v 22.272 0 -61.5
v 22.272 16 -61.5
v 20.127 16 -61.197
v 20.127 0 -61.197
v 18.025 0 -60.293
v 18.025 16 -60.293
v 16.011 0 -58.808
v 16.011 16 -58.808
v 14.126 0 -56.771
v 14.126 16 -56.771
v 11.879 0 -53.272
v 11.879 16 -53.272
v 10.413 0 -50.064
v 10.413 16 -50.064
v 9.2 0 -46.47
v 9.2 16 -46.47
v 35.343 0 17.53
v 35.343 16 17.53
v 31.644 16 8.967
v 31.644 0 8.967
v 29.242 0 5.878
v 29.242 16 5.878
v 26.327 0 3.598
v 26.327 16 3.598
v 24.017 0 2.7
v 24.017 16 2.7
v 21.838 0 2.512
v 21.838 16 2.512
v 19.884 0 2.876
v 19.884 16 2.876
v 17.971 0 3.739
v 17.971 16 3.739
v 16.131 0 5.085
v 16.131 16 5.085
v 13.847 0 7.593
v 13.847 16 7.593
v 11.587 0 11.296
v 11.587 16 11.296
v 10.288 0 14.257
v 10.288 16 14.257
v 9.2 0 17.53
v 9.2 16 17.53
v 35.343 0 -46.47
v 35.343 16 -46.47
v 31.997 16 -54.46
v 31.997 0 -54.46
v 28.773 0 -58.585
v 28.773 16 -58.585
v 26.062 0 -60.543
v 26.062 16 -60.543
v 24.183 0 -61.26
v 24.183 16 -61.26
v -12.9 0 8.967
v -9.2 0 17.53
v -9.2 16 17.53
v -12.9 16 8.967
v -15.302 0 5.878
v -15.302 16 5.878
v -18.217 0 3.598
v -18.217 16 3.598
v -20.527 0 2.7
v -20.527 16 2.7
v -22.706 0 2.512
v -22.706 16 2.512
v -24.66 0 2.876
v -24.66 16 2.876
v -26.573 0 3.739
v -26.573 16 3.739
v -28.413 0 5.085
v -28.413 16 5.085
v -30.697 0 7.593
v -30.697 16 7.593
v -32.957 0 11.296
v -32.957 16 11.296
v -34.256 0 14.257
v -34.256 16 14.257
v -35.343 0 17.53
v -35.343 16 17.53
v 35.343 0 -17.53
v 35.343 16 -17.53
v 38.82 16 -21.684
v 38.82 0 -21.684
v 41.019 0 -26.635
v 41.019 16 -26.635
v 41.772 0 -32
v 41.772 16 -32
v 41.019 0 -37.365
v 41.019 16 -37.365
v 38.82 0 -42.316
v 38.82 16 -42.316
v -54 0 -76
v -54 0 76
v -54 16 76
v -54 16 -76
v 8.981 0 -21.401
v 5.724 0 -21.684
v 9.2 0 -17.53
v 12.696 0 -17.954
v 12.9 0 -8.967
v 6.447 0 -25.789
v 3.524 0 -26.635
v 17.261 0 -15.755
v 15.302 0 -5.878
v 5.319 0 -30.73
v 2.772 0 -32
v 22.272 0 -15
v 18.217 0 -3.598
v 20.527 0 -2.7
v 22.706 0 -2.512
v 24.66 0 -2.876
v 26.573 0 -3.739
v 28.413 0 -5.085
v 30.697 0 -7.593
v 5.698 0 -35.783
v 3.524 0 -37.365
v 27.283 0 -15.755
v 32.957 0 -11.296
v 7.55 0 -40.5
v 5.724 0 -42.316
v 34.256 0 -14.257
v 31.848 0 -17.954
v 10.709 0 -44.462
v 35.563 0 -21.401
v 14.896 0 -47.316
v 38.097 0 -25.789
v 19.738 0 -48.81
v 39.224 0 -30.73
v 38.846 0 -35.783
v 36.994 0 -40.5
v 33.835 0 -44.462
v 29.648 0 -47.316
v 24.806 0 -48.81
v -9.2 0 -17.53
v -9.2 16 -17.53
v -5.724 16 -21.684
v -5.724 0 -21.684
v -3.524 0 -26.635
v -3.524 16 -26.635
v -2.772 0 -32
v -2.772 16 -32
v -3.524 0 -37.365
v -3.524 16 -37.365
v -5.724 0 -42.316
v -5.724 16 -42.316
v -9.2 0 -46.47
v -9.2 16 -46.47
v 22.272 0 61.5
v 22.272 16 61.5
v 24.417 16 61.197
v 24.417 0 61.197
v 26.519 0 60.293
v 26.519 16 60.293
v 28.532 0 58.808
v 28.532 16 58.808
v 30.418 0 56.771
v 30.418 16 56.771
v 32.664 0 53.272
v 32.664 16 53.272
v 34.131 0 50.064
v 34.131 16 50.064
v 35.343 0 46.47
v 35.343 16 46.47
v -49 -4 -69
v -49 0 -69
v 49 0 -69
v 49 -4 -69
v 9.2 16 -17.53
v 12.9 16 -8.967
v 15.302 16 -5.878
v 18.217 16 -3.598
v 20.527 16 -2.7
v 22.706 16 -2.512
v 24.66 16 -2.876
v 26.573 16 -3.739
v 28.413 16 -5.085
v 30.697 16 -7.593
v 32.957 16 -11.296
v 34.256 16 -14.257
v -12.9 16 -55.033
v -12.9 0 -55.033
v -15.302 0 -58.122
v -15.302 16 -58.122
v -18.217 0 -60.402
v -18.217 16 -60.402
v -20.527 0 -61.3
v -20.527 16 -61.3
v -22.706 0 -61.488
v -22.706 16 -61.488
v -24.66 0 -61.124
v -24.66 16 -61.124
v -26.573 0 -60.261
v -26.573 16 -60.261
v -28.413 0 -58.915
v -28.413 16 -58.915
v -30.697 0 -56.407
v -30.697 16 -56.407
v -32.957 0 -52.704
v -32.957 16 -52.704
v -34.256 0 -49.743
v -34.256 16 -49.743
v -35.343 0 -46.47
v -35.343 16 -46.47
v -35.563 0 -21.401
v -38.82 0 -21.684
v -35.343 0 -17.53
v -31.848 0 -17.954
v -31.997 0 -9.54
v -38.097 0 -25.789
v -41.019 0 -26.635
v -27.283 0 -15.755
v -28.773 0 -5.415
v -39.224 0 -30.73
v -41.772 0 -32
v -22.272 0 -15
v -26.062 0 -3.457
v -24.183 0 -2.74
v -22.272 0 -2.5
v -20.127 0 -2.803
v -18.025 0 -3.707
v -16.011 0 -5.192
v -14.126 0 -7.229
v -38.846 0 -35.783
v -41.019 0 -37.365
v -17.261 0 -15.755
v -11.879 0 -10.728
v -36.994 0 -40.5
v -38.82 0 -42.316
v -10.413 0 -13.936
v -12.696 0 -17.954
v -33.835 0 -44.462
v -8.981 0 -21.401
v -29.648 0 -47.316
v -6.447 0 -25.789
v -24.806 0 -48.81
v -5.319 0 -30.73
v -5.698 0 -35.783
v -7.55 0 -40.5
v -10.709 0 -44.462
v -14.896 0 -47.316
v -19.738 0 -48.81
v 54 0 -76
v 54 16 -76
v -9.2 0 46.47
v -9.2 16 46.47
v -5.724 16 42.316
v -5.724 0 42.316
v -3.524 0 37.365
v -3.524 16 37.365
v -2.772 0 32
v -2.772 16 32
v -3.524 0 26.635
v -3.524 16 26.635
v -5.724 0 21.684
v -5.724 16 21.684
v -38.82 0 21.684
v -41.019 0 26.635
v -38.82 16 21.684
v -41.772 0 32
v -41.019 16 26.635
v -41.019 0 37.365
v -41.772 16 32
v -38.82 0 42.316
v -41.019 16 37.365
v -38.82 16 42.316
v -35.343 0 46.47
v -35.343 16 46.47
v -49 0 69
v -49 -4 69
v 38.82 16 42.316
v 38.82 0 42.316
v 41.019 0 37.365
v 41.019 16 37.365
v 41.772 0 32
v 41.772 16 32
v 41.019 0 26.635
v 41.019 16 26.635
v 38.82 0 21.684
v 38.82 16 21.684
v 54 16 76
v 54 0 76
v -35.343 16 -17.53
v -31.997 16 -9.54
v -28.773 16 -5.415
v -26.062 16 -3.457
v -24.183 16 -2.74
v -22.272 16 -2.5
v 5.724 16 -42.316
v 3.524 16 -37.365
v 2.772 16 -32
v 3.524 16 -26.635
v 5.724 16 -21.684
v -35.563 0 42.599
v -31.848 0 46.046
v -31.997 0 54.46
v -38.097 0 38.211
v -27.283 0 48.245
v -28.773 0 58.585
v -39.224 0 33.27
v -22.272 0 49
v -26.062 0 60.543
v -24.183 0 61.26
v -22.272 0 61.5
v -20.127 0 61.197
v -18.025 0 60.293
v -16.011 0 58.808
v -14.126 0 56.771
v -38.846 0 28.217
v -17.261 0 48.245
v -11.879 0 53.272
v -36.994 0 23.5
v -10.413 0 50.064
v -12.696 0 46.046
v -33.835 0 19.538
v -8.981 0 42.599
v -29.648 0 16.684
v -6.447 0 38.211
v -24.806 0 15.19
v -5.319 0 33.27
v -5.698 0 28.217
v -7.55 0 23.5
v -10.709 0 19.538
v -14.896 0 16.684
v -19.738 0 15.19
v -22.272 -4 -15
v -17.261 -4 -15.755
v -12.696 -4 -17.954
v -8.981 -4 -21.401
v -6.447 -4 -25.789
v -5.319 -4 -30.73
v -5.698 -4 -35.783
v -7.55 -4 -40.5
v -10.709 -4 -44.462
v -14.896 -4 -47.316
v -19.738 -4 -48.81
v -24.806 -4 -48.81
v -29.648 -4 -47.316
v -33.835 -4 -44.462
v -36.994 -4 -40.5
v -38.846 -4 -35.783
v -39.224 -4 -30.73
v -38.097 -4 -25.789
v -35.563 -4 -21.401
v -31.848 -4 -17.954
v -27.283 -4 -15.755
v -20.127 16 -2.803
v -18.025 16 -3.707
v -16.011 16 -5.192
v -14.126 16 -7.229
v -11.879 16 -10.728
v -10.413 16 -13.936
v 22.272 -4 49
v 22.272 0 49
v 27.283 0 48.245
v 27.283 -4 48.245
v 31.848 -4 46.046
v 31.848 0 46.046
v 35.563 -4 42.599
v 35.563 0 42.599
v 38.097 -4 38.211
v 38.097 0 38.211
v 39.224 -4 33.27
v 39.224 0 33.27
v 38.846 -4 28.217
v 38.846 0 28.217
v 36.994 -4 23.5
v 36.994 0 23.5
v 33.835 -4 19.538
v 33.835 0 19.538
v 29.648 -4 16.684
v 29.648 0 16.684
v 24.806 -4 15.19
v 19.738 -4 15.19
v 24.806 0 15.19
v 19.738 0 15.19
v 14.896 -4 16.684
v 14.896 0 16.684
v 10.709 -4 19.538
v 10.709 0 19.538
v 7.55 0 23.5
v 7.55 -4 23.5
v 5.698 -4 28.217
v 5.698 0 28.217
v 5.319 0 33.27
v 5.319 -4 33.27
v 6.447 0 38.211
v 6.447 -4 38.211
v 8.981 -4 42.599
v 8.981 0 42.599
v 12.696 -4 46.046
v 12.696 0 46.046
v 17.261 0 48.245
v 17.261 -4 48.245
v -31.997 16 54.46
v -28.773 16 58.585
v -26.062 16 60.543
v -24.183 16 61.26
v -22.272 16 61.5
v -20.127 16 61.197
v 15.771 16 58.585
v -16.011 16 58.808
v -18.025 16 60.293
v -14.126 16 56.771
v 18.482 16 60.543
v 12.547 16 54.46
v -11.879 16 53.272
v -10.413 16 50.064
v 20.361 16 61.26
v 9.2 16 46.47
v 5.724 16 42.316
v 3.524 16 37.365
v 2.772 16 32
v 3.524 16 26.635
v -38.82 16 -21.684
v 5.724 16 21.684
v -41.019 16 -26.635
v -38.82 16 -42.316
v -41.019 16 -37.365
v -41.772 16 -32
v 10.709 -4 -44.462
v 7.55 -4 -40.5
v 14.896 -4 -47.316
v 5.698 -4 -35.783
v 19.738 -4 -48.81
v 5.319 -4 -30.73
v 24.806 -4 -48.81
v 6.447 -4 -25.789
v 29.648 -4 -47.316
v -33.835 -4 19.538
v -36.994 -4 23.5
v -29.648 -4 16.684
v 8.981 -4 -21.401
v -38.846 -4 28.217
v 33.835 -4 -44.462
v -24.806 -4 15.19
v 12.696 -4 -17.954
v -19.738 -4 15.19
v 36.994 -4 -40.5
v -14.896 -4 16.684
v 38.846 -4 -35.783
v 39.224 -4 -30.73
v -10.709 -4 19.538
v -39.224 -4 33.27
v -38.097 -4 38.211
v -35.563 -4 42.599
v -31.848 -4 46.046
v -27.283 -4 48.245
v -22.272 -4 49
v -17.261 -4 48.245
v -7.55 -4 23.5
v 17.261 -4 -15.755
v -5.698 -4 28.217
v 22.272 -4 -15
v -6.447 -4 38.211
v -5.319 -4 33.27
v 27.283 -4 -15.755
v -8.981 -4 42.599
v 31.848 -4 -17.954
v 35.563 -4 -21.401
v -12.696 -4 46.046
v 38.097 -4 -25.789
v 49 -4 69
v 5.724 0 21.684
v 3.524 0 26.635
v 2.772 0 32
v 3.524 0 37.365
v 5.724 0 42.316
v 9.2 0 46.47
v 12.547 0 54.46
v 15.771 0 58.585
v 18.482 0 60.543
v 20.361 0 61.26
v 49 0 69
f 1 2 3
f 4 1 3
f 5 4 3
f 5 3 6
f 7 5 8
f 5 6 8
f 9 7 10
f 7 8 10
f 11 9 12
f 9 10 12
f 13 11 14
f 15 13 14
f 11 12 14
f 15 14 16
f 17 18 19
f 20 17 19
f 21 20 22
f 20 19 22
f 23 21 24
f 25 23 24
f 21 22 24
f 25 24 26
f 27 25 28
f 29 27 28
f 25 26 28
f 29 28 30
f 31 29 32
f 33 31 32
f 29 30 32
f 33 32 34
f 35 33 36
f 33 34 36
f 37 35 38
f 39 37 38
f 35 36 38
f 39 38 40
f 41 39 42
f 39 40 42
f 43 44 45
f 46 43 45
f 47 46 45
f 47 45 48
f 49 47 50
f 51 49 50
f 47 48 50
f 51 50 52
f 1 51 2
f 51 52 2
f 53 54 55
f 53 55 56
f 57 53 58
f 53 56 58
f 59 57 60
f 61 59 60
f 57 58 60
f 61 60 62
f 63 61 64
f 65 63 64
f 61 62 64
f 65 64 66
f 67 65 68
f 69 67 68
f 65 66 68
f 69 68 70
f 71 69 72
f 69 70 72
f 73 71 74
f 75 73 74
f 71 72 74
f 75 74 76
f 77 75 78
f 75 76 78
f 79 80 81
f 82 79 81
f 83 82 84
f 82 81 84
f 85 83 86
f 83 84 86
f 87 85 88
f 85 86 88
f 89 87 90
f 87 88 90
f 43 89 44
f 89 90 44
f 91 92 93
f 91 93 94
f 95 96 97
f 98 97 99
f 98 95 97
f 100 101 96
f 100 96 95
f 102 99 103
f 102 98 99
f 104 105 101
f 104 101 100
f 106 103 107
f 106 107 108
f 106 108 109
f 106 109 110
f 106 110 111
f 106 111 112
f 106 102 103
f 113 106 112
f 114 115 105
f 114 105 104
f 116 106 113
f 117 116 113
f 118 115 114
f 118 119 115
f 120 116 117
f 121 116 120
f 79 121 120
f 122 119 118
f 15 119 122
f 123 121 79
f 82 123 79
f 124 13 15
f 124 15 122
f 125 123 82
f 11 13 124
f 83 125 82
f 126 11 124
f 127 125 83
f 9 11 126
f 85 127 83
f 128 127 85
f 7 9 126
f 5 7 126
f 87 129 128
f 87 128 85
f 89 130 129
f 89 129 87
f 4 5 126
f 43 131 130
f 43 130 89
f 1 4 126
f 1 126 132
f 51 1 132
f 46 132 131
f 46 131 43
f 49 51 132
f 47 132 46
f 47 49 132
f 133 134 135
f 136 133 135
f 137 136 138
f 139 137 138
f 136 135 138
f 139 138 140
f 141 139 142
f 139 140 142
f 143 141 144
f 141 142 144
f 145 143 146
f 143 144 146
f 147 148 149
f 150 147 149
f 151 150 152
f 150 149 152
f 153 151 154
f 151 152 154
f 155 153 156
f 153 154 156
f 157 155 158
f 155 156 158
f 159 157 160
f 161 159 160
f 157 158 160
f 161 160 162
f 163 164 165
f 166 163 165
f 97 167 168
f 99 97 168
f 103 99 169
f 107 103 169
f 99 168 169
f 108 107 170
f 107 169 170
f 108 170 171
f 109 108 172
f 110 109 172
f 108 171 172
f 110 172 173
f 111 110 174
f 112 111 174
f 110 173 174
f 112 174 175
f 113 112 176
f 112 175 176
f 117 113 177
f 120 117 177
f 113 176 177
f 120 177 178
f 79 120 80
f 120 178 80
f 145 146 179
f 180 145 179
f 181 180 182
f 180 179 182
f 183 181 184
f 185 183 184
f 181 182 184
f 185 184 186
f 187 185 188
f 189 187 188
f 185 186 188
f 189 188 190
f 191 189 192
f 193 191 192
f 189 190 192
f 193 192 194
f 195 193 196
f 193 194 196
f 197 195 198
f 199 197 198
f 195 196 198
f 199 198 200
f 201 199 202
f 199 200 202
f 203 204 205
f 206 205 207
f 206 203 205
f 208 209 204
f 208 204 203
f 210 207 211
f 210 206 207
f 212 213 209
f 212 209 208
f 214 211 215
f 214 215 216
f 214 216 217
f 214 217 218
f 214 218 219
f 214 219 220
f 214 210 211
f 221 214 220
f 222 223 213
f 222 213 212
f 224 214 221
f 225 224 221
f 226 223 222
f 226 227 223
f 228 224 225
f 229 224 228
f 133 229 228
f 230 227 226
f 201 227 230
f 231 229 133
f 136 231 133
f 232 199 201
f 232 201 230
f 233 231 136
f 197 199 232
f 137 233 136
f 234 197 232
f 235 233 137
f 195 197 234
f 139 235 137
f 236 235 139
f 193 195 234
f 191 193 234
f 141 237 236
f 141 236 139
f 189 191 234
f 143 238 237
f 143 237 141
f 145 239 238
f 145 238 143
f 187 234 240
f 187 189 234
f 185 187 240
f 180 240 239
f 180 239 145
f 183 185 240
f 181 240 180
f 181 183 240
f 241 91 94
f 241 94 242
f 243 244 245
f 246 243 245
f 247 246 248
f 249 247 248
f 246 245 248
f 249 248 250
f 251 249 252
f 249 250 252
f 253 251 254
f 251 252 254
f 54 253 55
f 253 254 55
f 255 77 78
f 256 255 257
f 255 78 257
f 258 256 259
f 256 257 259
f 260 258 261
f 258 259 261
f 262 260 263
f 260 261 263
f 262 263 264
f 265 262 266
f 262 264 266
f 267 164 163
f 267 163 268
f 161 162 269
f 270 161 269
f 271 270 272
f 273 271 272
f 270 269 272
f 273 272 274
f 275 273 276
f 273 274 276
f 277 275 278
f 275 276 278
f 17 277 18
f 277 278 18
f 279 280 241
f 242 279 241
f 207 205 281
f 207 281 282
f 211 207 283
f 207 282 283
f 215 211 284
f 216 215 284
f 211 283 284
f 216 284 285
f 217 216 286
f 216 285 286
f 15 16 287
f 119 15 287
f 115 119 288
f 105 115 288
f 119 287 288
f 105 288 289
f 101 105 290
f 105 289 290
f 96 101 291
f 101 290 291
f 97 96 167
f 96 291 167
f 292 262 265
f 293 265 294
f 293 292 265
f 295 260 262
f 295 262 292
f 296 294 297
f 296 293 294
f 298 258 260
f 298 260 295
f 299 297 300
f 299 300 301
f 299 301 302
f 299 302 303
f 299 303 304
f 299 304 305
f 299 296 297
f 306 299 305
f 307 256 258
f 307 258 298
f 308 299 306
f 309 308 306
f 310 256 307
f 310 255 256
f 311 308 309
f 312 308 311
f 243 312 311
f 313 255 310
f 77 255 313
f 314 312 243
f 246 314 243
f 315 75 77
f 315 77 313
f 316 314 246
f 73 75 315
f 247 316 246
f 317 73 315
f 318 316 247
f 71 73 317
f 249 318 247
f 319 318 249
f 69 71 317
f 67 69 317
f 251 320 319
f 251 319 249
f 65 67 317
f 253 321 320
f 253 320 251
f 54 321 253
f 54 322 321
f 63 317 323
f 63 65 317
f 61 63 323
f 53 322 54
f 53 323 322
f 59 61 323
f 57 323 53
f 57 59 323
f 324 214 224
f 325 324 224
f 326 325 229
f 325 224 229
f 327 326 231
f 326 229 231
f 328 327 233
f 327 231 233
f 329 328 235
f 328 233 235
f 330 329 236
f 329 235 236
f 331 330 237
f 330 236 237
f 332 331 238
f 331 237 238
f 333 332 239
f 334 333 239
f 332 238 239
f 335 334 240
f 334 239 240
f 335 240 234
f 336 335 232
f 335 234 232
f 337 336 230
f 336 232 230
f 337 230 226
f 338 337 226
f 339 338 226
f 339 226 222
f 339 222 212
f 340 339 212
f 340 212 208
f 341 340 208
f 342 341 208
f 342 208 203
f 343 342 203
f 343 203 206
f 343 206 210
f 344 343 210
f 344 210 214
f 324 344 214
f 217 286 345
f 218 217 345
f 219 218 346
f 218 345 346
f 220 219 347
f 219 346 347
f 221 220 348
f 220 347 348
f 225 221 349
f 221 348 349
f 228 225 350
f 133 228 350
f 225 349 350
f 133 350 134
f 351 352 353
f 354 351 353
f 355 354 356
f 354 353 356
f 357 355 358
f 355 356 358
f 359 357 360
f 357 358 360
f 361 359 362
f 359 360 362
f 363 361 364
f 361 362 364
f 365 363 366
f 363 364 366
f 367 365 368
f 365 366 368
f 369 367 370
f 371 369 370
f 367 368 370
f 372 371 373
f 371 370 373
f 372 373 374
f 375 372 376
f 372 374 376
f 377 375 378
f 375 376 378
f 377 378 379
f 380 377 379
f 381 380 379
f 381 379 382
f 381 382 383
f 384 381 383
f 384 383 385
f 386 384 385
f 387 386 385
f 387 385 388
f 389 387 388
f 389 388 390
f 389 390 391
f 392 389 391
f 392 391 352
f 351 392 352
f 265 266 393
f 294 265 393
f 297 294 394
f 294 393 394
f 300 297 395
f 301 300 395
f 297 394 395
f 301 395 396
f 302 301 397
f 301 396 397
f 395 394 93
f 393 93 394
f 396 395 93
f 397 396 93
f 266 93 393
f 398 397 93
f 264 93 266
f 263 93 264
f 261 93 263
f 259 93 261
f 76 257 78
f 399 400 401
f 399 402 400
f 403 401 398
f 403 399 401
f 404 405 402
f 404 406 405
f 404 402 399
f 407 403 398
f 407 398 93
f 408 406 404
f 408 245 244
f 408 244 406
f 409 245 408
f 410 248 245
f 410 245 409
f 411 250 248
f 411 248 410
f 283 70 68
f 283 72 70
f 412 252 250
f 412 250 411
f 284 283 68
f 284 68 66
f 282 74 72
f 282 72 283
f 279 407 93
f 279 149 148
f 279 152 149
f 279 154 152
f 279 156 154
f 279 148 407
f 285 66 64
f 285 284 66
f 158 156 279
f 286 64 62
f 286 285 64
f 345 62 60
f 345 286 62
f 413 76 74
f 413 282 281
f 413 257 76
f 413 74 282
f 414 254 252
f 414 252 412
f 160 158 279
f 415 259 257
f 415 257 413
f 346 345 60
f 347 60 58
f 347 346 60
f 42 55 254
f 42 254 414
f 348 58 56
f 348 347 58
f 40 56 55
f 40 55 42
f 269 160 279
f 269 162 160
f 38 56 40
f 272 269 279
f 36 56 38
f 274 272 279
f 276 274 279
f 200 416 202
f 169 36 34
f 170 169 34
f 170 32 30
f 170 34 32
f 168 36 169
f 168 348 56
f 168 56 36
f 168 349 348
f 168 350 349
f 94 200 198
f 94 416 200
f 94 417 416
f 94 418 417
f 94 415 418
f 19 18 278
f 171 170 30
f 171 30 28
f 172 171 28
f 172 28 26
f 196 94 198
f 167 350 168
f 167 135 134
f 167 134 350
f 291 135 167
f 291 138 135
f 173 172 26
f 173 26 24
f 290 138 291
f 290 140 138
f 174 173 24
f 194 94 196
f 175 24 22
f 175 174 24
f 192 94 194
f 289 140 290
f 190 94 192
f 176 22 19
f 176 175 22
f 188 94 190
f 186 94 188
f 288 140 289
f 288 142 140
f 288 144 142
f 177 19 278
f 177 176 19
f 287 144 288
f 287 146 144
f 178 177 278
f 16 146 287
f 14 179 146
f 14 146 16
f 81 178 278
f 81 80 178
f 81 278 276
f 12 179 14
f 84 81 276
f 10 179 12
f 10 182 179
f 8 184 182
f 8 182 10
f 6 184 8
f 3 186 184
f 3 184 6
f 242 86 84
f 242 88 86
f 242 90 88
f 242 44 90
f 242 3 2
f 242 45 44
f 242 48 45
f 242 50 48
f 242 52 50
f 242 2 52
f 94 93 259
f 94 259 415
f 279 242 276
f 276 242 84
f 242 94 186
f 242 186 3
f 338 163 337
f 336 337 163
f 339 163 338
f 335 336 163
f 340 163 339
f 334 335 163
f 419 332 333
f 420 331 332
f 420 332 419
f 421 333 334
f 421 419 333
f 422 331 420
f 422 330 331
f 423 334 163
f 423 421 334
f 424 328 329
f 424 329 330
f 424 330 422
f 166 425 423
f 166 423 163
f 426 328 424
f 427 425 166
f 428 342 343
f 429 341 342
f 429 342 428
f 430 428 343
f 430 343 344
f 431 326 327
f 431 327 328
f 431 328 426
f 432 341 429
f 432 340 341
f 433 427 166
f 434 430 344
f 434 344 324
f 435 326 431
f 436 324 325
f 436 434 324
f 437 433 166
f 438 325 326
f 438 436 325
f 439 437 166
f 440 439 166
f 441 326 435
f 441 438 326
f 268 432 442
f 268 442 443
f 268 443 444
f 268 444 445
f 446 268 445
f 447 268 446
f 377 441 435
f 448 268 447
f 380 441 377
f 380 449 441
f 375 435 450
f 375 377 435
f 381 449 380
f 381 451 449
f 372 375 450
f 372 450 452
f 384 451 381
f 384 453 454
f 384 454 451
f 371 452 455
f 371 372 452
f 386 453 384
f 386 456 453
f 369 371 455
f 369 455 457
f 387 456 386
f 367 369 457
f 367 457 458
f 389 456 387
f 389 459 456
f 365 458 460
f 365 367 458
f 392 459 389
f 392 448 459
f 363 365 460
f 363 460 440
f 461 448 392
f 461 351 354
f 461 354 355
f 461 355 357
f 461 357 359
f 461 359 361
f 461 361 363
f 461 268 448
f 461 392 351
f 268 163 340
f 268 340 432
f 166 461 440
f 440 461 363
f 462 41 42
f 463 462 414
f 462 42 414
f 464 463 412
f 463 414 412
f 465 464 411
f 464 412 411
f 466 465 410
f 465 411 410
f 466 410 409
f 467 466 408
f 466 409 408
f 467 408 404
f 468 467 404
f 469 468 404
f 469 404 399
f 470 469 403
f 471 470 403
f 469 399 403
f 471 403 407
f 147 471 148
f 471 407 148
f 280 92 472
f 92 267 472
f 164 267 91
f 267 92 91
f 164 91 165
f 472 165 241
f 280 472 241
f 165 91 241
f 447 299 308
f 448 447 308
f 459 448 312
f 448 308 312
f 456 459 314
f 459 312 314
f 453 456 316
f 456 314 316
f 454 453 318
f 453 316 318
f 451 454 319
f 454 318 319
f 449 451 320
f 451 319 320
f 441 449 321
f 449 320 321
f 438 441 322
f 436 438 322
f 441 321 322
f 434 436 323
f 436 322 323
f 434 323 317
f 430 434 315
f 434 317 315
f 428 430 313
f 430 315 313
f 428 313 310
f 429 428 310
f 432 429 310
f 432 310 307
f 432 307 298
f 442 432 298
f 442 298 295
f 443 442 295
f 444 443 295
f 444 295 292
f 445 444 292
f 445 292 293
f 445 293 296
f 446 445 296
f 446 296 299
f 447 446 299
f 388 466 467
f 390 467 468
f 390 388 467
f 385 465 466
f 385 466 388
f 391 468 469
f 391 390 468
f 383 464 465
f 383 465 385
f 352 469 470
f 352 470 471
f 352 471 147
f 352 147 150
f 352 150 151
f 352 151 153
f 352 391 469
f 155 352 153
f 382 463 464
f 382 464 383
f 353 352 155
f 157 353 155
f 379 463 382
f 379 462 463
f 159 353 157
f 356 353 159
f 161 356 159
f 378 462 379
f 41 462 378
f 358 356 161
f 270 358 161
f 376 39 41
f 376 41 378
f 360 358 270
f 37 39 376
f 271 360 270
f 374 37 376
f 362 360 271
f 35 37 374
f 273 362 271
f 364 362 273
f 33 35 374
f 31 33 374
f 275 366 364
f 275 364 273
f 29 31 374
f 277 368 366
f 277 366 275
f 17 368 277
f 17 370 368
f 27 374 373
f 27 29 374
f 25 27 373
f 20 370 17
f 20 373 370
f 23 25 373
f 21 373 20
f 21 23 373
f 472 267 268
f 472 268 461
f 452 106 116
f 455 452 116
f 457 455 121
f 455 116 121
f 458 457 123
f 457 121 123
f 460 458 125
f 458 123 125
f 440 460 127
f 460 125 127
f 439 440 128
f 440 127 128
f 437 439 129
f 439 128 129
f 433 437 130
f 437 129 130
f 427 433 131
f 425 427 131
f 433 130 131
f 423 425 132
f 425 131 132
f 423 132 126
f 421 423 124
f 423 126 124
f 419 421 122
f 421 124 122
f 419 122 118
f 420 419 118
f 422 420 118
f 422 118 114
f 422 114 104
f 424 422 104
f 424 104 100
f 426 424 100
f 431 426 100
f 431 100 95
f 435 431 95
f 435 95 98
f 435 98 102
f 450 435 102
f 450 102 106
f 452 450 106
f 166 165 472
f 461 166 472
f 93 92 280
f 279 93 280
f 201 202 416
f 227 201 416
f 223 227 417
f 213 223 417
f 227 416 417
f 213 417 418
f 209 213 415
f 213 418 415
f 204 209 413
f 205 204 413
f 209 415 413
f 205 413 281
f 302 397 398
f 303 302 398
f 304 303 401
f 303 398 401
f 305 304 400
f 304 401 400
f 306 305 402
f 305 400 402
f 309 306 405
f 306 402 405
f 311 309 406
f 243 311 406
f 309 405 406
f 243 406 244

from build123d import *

# Parameters (mm, degrees)
SKETCH3_W           = 108
SKETCH3_H           = 152
BOSS_EXTRUDE1_DEPTH = 16
SKETCH7_W           = 98
SKETCH7_H           = 138
BOSS_EXTRUDE2_DEPTH = 4
SKETCH6_R           = 19.5
SKETCH6_RX          = 29.5
SKETCH6_RY          = 15
CUT_EXTRUDE2_DEPTH  = 16
SKETCH8_R           = 17
CUT_EXTRUDE3_DEPTH  = 10


with BuildPart() as part:
    # Sketch3 → Boss-Extrude1 (new body)
    with BuildSketch(Plane(origin=(0, 0, 0), x_dir=(1, 0, 0), z_dir=(0, 1, 0))):
        Rectangle(SKETCH3_W, SKETCH3_H)
    extrude(amount=BOSS_EXTRUDE1_DEPTH)

    # Sketch7 → Boss-Extrude2 (add)
    with BuildSketch(Plane.XZ):
        Rectangle(SKETCH7_W, SKETCH7_H)
    extrude(amount=BOSS_EXTRUDE2_DEPTH)

    # Sketch6 → Cut-Extrude2 (cut)
    with BuildSketch(Plane(origin=(0, 16, 0), x_dir=(1, 0, 0), z_dir=(0, 1, 0))):
        with Locations((22.271949374, 32)):
            Circle(SKETCH6_R)
        with Locations((22.271949374, -32)):
            Circle(SKETCH6_R)
        with Locations((-22.271949374, -32)):
            Circle(SKETCH6_R)
        with Locations((-22.271949374, 32)):
            Circle(SKETCH6_R)
        with Locations(Location((-22.271949374, 32), (0, 0, -90))):
            Ellipse(SKETCH6_RX, SKETCH6_RY)
        with Locations(Location((22.271949374, -32), (0, 0, -90))):
            Ellipse(SKETCH6_RX, SKETCH6_RY)
        with Locations(Location((-22.271949374, -32), (0, 0, -90))):
            Ellipse(SKETCH6_RX, SKETCH6_RY)
        with Locations(Location((22.271949374, 32), (0, 0, 90))):
            Ellipse(SKETCH6_RX, SKETCH6_RY)
    extrude(amount=-CUT_EXTRUDE2_DEPTH, mode=Mode.SUBTRACT)

    # Sketch8 → Cut-Extrude3 (cut)
    with BuildSketch(Plane(origin=(0, 0, 0), x_dir=(1, 0, 0), z_dir=(0, 1, 0))):
        with Locations(Location((-22.271949374, 32, 0), (0, 0, 270))):
            Circle(SKETCH8_R)
        with Locations(Location((22.271949374, 32, 0), (0, 0, 270))):
            Circle(SKETCH8_R)
        with Locations(Location((22.271949374, -32, 0), (0, 0, 270))):
            Circle(SKETCH8_R)
        with Locations(Location((-22.271949374, -32, 0), (0, 0, 270))):
            Circle(SKETCH8_R)
    extrude(amount=-CUT_EXTRUDE3_DEPTH, mode=Mode.SUBTRACT)


solid = part.part
